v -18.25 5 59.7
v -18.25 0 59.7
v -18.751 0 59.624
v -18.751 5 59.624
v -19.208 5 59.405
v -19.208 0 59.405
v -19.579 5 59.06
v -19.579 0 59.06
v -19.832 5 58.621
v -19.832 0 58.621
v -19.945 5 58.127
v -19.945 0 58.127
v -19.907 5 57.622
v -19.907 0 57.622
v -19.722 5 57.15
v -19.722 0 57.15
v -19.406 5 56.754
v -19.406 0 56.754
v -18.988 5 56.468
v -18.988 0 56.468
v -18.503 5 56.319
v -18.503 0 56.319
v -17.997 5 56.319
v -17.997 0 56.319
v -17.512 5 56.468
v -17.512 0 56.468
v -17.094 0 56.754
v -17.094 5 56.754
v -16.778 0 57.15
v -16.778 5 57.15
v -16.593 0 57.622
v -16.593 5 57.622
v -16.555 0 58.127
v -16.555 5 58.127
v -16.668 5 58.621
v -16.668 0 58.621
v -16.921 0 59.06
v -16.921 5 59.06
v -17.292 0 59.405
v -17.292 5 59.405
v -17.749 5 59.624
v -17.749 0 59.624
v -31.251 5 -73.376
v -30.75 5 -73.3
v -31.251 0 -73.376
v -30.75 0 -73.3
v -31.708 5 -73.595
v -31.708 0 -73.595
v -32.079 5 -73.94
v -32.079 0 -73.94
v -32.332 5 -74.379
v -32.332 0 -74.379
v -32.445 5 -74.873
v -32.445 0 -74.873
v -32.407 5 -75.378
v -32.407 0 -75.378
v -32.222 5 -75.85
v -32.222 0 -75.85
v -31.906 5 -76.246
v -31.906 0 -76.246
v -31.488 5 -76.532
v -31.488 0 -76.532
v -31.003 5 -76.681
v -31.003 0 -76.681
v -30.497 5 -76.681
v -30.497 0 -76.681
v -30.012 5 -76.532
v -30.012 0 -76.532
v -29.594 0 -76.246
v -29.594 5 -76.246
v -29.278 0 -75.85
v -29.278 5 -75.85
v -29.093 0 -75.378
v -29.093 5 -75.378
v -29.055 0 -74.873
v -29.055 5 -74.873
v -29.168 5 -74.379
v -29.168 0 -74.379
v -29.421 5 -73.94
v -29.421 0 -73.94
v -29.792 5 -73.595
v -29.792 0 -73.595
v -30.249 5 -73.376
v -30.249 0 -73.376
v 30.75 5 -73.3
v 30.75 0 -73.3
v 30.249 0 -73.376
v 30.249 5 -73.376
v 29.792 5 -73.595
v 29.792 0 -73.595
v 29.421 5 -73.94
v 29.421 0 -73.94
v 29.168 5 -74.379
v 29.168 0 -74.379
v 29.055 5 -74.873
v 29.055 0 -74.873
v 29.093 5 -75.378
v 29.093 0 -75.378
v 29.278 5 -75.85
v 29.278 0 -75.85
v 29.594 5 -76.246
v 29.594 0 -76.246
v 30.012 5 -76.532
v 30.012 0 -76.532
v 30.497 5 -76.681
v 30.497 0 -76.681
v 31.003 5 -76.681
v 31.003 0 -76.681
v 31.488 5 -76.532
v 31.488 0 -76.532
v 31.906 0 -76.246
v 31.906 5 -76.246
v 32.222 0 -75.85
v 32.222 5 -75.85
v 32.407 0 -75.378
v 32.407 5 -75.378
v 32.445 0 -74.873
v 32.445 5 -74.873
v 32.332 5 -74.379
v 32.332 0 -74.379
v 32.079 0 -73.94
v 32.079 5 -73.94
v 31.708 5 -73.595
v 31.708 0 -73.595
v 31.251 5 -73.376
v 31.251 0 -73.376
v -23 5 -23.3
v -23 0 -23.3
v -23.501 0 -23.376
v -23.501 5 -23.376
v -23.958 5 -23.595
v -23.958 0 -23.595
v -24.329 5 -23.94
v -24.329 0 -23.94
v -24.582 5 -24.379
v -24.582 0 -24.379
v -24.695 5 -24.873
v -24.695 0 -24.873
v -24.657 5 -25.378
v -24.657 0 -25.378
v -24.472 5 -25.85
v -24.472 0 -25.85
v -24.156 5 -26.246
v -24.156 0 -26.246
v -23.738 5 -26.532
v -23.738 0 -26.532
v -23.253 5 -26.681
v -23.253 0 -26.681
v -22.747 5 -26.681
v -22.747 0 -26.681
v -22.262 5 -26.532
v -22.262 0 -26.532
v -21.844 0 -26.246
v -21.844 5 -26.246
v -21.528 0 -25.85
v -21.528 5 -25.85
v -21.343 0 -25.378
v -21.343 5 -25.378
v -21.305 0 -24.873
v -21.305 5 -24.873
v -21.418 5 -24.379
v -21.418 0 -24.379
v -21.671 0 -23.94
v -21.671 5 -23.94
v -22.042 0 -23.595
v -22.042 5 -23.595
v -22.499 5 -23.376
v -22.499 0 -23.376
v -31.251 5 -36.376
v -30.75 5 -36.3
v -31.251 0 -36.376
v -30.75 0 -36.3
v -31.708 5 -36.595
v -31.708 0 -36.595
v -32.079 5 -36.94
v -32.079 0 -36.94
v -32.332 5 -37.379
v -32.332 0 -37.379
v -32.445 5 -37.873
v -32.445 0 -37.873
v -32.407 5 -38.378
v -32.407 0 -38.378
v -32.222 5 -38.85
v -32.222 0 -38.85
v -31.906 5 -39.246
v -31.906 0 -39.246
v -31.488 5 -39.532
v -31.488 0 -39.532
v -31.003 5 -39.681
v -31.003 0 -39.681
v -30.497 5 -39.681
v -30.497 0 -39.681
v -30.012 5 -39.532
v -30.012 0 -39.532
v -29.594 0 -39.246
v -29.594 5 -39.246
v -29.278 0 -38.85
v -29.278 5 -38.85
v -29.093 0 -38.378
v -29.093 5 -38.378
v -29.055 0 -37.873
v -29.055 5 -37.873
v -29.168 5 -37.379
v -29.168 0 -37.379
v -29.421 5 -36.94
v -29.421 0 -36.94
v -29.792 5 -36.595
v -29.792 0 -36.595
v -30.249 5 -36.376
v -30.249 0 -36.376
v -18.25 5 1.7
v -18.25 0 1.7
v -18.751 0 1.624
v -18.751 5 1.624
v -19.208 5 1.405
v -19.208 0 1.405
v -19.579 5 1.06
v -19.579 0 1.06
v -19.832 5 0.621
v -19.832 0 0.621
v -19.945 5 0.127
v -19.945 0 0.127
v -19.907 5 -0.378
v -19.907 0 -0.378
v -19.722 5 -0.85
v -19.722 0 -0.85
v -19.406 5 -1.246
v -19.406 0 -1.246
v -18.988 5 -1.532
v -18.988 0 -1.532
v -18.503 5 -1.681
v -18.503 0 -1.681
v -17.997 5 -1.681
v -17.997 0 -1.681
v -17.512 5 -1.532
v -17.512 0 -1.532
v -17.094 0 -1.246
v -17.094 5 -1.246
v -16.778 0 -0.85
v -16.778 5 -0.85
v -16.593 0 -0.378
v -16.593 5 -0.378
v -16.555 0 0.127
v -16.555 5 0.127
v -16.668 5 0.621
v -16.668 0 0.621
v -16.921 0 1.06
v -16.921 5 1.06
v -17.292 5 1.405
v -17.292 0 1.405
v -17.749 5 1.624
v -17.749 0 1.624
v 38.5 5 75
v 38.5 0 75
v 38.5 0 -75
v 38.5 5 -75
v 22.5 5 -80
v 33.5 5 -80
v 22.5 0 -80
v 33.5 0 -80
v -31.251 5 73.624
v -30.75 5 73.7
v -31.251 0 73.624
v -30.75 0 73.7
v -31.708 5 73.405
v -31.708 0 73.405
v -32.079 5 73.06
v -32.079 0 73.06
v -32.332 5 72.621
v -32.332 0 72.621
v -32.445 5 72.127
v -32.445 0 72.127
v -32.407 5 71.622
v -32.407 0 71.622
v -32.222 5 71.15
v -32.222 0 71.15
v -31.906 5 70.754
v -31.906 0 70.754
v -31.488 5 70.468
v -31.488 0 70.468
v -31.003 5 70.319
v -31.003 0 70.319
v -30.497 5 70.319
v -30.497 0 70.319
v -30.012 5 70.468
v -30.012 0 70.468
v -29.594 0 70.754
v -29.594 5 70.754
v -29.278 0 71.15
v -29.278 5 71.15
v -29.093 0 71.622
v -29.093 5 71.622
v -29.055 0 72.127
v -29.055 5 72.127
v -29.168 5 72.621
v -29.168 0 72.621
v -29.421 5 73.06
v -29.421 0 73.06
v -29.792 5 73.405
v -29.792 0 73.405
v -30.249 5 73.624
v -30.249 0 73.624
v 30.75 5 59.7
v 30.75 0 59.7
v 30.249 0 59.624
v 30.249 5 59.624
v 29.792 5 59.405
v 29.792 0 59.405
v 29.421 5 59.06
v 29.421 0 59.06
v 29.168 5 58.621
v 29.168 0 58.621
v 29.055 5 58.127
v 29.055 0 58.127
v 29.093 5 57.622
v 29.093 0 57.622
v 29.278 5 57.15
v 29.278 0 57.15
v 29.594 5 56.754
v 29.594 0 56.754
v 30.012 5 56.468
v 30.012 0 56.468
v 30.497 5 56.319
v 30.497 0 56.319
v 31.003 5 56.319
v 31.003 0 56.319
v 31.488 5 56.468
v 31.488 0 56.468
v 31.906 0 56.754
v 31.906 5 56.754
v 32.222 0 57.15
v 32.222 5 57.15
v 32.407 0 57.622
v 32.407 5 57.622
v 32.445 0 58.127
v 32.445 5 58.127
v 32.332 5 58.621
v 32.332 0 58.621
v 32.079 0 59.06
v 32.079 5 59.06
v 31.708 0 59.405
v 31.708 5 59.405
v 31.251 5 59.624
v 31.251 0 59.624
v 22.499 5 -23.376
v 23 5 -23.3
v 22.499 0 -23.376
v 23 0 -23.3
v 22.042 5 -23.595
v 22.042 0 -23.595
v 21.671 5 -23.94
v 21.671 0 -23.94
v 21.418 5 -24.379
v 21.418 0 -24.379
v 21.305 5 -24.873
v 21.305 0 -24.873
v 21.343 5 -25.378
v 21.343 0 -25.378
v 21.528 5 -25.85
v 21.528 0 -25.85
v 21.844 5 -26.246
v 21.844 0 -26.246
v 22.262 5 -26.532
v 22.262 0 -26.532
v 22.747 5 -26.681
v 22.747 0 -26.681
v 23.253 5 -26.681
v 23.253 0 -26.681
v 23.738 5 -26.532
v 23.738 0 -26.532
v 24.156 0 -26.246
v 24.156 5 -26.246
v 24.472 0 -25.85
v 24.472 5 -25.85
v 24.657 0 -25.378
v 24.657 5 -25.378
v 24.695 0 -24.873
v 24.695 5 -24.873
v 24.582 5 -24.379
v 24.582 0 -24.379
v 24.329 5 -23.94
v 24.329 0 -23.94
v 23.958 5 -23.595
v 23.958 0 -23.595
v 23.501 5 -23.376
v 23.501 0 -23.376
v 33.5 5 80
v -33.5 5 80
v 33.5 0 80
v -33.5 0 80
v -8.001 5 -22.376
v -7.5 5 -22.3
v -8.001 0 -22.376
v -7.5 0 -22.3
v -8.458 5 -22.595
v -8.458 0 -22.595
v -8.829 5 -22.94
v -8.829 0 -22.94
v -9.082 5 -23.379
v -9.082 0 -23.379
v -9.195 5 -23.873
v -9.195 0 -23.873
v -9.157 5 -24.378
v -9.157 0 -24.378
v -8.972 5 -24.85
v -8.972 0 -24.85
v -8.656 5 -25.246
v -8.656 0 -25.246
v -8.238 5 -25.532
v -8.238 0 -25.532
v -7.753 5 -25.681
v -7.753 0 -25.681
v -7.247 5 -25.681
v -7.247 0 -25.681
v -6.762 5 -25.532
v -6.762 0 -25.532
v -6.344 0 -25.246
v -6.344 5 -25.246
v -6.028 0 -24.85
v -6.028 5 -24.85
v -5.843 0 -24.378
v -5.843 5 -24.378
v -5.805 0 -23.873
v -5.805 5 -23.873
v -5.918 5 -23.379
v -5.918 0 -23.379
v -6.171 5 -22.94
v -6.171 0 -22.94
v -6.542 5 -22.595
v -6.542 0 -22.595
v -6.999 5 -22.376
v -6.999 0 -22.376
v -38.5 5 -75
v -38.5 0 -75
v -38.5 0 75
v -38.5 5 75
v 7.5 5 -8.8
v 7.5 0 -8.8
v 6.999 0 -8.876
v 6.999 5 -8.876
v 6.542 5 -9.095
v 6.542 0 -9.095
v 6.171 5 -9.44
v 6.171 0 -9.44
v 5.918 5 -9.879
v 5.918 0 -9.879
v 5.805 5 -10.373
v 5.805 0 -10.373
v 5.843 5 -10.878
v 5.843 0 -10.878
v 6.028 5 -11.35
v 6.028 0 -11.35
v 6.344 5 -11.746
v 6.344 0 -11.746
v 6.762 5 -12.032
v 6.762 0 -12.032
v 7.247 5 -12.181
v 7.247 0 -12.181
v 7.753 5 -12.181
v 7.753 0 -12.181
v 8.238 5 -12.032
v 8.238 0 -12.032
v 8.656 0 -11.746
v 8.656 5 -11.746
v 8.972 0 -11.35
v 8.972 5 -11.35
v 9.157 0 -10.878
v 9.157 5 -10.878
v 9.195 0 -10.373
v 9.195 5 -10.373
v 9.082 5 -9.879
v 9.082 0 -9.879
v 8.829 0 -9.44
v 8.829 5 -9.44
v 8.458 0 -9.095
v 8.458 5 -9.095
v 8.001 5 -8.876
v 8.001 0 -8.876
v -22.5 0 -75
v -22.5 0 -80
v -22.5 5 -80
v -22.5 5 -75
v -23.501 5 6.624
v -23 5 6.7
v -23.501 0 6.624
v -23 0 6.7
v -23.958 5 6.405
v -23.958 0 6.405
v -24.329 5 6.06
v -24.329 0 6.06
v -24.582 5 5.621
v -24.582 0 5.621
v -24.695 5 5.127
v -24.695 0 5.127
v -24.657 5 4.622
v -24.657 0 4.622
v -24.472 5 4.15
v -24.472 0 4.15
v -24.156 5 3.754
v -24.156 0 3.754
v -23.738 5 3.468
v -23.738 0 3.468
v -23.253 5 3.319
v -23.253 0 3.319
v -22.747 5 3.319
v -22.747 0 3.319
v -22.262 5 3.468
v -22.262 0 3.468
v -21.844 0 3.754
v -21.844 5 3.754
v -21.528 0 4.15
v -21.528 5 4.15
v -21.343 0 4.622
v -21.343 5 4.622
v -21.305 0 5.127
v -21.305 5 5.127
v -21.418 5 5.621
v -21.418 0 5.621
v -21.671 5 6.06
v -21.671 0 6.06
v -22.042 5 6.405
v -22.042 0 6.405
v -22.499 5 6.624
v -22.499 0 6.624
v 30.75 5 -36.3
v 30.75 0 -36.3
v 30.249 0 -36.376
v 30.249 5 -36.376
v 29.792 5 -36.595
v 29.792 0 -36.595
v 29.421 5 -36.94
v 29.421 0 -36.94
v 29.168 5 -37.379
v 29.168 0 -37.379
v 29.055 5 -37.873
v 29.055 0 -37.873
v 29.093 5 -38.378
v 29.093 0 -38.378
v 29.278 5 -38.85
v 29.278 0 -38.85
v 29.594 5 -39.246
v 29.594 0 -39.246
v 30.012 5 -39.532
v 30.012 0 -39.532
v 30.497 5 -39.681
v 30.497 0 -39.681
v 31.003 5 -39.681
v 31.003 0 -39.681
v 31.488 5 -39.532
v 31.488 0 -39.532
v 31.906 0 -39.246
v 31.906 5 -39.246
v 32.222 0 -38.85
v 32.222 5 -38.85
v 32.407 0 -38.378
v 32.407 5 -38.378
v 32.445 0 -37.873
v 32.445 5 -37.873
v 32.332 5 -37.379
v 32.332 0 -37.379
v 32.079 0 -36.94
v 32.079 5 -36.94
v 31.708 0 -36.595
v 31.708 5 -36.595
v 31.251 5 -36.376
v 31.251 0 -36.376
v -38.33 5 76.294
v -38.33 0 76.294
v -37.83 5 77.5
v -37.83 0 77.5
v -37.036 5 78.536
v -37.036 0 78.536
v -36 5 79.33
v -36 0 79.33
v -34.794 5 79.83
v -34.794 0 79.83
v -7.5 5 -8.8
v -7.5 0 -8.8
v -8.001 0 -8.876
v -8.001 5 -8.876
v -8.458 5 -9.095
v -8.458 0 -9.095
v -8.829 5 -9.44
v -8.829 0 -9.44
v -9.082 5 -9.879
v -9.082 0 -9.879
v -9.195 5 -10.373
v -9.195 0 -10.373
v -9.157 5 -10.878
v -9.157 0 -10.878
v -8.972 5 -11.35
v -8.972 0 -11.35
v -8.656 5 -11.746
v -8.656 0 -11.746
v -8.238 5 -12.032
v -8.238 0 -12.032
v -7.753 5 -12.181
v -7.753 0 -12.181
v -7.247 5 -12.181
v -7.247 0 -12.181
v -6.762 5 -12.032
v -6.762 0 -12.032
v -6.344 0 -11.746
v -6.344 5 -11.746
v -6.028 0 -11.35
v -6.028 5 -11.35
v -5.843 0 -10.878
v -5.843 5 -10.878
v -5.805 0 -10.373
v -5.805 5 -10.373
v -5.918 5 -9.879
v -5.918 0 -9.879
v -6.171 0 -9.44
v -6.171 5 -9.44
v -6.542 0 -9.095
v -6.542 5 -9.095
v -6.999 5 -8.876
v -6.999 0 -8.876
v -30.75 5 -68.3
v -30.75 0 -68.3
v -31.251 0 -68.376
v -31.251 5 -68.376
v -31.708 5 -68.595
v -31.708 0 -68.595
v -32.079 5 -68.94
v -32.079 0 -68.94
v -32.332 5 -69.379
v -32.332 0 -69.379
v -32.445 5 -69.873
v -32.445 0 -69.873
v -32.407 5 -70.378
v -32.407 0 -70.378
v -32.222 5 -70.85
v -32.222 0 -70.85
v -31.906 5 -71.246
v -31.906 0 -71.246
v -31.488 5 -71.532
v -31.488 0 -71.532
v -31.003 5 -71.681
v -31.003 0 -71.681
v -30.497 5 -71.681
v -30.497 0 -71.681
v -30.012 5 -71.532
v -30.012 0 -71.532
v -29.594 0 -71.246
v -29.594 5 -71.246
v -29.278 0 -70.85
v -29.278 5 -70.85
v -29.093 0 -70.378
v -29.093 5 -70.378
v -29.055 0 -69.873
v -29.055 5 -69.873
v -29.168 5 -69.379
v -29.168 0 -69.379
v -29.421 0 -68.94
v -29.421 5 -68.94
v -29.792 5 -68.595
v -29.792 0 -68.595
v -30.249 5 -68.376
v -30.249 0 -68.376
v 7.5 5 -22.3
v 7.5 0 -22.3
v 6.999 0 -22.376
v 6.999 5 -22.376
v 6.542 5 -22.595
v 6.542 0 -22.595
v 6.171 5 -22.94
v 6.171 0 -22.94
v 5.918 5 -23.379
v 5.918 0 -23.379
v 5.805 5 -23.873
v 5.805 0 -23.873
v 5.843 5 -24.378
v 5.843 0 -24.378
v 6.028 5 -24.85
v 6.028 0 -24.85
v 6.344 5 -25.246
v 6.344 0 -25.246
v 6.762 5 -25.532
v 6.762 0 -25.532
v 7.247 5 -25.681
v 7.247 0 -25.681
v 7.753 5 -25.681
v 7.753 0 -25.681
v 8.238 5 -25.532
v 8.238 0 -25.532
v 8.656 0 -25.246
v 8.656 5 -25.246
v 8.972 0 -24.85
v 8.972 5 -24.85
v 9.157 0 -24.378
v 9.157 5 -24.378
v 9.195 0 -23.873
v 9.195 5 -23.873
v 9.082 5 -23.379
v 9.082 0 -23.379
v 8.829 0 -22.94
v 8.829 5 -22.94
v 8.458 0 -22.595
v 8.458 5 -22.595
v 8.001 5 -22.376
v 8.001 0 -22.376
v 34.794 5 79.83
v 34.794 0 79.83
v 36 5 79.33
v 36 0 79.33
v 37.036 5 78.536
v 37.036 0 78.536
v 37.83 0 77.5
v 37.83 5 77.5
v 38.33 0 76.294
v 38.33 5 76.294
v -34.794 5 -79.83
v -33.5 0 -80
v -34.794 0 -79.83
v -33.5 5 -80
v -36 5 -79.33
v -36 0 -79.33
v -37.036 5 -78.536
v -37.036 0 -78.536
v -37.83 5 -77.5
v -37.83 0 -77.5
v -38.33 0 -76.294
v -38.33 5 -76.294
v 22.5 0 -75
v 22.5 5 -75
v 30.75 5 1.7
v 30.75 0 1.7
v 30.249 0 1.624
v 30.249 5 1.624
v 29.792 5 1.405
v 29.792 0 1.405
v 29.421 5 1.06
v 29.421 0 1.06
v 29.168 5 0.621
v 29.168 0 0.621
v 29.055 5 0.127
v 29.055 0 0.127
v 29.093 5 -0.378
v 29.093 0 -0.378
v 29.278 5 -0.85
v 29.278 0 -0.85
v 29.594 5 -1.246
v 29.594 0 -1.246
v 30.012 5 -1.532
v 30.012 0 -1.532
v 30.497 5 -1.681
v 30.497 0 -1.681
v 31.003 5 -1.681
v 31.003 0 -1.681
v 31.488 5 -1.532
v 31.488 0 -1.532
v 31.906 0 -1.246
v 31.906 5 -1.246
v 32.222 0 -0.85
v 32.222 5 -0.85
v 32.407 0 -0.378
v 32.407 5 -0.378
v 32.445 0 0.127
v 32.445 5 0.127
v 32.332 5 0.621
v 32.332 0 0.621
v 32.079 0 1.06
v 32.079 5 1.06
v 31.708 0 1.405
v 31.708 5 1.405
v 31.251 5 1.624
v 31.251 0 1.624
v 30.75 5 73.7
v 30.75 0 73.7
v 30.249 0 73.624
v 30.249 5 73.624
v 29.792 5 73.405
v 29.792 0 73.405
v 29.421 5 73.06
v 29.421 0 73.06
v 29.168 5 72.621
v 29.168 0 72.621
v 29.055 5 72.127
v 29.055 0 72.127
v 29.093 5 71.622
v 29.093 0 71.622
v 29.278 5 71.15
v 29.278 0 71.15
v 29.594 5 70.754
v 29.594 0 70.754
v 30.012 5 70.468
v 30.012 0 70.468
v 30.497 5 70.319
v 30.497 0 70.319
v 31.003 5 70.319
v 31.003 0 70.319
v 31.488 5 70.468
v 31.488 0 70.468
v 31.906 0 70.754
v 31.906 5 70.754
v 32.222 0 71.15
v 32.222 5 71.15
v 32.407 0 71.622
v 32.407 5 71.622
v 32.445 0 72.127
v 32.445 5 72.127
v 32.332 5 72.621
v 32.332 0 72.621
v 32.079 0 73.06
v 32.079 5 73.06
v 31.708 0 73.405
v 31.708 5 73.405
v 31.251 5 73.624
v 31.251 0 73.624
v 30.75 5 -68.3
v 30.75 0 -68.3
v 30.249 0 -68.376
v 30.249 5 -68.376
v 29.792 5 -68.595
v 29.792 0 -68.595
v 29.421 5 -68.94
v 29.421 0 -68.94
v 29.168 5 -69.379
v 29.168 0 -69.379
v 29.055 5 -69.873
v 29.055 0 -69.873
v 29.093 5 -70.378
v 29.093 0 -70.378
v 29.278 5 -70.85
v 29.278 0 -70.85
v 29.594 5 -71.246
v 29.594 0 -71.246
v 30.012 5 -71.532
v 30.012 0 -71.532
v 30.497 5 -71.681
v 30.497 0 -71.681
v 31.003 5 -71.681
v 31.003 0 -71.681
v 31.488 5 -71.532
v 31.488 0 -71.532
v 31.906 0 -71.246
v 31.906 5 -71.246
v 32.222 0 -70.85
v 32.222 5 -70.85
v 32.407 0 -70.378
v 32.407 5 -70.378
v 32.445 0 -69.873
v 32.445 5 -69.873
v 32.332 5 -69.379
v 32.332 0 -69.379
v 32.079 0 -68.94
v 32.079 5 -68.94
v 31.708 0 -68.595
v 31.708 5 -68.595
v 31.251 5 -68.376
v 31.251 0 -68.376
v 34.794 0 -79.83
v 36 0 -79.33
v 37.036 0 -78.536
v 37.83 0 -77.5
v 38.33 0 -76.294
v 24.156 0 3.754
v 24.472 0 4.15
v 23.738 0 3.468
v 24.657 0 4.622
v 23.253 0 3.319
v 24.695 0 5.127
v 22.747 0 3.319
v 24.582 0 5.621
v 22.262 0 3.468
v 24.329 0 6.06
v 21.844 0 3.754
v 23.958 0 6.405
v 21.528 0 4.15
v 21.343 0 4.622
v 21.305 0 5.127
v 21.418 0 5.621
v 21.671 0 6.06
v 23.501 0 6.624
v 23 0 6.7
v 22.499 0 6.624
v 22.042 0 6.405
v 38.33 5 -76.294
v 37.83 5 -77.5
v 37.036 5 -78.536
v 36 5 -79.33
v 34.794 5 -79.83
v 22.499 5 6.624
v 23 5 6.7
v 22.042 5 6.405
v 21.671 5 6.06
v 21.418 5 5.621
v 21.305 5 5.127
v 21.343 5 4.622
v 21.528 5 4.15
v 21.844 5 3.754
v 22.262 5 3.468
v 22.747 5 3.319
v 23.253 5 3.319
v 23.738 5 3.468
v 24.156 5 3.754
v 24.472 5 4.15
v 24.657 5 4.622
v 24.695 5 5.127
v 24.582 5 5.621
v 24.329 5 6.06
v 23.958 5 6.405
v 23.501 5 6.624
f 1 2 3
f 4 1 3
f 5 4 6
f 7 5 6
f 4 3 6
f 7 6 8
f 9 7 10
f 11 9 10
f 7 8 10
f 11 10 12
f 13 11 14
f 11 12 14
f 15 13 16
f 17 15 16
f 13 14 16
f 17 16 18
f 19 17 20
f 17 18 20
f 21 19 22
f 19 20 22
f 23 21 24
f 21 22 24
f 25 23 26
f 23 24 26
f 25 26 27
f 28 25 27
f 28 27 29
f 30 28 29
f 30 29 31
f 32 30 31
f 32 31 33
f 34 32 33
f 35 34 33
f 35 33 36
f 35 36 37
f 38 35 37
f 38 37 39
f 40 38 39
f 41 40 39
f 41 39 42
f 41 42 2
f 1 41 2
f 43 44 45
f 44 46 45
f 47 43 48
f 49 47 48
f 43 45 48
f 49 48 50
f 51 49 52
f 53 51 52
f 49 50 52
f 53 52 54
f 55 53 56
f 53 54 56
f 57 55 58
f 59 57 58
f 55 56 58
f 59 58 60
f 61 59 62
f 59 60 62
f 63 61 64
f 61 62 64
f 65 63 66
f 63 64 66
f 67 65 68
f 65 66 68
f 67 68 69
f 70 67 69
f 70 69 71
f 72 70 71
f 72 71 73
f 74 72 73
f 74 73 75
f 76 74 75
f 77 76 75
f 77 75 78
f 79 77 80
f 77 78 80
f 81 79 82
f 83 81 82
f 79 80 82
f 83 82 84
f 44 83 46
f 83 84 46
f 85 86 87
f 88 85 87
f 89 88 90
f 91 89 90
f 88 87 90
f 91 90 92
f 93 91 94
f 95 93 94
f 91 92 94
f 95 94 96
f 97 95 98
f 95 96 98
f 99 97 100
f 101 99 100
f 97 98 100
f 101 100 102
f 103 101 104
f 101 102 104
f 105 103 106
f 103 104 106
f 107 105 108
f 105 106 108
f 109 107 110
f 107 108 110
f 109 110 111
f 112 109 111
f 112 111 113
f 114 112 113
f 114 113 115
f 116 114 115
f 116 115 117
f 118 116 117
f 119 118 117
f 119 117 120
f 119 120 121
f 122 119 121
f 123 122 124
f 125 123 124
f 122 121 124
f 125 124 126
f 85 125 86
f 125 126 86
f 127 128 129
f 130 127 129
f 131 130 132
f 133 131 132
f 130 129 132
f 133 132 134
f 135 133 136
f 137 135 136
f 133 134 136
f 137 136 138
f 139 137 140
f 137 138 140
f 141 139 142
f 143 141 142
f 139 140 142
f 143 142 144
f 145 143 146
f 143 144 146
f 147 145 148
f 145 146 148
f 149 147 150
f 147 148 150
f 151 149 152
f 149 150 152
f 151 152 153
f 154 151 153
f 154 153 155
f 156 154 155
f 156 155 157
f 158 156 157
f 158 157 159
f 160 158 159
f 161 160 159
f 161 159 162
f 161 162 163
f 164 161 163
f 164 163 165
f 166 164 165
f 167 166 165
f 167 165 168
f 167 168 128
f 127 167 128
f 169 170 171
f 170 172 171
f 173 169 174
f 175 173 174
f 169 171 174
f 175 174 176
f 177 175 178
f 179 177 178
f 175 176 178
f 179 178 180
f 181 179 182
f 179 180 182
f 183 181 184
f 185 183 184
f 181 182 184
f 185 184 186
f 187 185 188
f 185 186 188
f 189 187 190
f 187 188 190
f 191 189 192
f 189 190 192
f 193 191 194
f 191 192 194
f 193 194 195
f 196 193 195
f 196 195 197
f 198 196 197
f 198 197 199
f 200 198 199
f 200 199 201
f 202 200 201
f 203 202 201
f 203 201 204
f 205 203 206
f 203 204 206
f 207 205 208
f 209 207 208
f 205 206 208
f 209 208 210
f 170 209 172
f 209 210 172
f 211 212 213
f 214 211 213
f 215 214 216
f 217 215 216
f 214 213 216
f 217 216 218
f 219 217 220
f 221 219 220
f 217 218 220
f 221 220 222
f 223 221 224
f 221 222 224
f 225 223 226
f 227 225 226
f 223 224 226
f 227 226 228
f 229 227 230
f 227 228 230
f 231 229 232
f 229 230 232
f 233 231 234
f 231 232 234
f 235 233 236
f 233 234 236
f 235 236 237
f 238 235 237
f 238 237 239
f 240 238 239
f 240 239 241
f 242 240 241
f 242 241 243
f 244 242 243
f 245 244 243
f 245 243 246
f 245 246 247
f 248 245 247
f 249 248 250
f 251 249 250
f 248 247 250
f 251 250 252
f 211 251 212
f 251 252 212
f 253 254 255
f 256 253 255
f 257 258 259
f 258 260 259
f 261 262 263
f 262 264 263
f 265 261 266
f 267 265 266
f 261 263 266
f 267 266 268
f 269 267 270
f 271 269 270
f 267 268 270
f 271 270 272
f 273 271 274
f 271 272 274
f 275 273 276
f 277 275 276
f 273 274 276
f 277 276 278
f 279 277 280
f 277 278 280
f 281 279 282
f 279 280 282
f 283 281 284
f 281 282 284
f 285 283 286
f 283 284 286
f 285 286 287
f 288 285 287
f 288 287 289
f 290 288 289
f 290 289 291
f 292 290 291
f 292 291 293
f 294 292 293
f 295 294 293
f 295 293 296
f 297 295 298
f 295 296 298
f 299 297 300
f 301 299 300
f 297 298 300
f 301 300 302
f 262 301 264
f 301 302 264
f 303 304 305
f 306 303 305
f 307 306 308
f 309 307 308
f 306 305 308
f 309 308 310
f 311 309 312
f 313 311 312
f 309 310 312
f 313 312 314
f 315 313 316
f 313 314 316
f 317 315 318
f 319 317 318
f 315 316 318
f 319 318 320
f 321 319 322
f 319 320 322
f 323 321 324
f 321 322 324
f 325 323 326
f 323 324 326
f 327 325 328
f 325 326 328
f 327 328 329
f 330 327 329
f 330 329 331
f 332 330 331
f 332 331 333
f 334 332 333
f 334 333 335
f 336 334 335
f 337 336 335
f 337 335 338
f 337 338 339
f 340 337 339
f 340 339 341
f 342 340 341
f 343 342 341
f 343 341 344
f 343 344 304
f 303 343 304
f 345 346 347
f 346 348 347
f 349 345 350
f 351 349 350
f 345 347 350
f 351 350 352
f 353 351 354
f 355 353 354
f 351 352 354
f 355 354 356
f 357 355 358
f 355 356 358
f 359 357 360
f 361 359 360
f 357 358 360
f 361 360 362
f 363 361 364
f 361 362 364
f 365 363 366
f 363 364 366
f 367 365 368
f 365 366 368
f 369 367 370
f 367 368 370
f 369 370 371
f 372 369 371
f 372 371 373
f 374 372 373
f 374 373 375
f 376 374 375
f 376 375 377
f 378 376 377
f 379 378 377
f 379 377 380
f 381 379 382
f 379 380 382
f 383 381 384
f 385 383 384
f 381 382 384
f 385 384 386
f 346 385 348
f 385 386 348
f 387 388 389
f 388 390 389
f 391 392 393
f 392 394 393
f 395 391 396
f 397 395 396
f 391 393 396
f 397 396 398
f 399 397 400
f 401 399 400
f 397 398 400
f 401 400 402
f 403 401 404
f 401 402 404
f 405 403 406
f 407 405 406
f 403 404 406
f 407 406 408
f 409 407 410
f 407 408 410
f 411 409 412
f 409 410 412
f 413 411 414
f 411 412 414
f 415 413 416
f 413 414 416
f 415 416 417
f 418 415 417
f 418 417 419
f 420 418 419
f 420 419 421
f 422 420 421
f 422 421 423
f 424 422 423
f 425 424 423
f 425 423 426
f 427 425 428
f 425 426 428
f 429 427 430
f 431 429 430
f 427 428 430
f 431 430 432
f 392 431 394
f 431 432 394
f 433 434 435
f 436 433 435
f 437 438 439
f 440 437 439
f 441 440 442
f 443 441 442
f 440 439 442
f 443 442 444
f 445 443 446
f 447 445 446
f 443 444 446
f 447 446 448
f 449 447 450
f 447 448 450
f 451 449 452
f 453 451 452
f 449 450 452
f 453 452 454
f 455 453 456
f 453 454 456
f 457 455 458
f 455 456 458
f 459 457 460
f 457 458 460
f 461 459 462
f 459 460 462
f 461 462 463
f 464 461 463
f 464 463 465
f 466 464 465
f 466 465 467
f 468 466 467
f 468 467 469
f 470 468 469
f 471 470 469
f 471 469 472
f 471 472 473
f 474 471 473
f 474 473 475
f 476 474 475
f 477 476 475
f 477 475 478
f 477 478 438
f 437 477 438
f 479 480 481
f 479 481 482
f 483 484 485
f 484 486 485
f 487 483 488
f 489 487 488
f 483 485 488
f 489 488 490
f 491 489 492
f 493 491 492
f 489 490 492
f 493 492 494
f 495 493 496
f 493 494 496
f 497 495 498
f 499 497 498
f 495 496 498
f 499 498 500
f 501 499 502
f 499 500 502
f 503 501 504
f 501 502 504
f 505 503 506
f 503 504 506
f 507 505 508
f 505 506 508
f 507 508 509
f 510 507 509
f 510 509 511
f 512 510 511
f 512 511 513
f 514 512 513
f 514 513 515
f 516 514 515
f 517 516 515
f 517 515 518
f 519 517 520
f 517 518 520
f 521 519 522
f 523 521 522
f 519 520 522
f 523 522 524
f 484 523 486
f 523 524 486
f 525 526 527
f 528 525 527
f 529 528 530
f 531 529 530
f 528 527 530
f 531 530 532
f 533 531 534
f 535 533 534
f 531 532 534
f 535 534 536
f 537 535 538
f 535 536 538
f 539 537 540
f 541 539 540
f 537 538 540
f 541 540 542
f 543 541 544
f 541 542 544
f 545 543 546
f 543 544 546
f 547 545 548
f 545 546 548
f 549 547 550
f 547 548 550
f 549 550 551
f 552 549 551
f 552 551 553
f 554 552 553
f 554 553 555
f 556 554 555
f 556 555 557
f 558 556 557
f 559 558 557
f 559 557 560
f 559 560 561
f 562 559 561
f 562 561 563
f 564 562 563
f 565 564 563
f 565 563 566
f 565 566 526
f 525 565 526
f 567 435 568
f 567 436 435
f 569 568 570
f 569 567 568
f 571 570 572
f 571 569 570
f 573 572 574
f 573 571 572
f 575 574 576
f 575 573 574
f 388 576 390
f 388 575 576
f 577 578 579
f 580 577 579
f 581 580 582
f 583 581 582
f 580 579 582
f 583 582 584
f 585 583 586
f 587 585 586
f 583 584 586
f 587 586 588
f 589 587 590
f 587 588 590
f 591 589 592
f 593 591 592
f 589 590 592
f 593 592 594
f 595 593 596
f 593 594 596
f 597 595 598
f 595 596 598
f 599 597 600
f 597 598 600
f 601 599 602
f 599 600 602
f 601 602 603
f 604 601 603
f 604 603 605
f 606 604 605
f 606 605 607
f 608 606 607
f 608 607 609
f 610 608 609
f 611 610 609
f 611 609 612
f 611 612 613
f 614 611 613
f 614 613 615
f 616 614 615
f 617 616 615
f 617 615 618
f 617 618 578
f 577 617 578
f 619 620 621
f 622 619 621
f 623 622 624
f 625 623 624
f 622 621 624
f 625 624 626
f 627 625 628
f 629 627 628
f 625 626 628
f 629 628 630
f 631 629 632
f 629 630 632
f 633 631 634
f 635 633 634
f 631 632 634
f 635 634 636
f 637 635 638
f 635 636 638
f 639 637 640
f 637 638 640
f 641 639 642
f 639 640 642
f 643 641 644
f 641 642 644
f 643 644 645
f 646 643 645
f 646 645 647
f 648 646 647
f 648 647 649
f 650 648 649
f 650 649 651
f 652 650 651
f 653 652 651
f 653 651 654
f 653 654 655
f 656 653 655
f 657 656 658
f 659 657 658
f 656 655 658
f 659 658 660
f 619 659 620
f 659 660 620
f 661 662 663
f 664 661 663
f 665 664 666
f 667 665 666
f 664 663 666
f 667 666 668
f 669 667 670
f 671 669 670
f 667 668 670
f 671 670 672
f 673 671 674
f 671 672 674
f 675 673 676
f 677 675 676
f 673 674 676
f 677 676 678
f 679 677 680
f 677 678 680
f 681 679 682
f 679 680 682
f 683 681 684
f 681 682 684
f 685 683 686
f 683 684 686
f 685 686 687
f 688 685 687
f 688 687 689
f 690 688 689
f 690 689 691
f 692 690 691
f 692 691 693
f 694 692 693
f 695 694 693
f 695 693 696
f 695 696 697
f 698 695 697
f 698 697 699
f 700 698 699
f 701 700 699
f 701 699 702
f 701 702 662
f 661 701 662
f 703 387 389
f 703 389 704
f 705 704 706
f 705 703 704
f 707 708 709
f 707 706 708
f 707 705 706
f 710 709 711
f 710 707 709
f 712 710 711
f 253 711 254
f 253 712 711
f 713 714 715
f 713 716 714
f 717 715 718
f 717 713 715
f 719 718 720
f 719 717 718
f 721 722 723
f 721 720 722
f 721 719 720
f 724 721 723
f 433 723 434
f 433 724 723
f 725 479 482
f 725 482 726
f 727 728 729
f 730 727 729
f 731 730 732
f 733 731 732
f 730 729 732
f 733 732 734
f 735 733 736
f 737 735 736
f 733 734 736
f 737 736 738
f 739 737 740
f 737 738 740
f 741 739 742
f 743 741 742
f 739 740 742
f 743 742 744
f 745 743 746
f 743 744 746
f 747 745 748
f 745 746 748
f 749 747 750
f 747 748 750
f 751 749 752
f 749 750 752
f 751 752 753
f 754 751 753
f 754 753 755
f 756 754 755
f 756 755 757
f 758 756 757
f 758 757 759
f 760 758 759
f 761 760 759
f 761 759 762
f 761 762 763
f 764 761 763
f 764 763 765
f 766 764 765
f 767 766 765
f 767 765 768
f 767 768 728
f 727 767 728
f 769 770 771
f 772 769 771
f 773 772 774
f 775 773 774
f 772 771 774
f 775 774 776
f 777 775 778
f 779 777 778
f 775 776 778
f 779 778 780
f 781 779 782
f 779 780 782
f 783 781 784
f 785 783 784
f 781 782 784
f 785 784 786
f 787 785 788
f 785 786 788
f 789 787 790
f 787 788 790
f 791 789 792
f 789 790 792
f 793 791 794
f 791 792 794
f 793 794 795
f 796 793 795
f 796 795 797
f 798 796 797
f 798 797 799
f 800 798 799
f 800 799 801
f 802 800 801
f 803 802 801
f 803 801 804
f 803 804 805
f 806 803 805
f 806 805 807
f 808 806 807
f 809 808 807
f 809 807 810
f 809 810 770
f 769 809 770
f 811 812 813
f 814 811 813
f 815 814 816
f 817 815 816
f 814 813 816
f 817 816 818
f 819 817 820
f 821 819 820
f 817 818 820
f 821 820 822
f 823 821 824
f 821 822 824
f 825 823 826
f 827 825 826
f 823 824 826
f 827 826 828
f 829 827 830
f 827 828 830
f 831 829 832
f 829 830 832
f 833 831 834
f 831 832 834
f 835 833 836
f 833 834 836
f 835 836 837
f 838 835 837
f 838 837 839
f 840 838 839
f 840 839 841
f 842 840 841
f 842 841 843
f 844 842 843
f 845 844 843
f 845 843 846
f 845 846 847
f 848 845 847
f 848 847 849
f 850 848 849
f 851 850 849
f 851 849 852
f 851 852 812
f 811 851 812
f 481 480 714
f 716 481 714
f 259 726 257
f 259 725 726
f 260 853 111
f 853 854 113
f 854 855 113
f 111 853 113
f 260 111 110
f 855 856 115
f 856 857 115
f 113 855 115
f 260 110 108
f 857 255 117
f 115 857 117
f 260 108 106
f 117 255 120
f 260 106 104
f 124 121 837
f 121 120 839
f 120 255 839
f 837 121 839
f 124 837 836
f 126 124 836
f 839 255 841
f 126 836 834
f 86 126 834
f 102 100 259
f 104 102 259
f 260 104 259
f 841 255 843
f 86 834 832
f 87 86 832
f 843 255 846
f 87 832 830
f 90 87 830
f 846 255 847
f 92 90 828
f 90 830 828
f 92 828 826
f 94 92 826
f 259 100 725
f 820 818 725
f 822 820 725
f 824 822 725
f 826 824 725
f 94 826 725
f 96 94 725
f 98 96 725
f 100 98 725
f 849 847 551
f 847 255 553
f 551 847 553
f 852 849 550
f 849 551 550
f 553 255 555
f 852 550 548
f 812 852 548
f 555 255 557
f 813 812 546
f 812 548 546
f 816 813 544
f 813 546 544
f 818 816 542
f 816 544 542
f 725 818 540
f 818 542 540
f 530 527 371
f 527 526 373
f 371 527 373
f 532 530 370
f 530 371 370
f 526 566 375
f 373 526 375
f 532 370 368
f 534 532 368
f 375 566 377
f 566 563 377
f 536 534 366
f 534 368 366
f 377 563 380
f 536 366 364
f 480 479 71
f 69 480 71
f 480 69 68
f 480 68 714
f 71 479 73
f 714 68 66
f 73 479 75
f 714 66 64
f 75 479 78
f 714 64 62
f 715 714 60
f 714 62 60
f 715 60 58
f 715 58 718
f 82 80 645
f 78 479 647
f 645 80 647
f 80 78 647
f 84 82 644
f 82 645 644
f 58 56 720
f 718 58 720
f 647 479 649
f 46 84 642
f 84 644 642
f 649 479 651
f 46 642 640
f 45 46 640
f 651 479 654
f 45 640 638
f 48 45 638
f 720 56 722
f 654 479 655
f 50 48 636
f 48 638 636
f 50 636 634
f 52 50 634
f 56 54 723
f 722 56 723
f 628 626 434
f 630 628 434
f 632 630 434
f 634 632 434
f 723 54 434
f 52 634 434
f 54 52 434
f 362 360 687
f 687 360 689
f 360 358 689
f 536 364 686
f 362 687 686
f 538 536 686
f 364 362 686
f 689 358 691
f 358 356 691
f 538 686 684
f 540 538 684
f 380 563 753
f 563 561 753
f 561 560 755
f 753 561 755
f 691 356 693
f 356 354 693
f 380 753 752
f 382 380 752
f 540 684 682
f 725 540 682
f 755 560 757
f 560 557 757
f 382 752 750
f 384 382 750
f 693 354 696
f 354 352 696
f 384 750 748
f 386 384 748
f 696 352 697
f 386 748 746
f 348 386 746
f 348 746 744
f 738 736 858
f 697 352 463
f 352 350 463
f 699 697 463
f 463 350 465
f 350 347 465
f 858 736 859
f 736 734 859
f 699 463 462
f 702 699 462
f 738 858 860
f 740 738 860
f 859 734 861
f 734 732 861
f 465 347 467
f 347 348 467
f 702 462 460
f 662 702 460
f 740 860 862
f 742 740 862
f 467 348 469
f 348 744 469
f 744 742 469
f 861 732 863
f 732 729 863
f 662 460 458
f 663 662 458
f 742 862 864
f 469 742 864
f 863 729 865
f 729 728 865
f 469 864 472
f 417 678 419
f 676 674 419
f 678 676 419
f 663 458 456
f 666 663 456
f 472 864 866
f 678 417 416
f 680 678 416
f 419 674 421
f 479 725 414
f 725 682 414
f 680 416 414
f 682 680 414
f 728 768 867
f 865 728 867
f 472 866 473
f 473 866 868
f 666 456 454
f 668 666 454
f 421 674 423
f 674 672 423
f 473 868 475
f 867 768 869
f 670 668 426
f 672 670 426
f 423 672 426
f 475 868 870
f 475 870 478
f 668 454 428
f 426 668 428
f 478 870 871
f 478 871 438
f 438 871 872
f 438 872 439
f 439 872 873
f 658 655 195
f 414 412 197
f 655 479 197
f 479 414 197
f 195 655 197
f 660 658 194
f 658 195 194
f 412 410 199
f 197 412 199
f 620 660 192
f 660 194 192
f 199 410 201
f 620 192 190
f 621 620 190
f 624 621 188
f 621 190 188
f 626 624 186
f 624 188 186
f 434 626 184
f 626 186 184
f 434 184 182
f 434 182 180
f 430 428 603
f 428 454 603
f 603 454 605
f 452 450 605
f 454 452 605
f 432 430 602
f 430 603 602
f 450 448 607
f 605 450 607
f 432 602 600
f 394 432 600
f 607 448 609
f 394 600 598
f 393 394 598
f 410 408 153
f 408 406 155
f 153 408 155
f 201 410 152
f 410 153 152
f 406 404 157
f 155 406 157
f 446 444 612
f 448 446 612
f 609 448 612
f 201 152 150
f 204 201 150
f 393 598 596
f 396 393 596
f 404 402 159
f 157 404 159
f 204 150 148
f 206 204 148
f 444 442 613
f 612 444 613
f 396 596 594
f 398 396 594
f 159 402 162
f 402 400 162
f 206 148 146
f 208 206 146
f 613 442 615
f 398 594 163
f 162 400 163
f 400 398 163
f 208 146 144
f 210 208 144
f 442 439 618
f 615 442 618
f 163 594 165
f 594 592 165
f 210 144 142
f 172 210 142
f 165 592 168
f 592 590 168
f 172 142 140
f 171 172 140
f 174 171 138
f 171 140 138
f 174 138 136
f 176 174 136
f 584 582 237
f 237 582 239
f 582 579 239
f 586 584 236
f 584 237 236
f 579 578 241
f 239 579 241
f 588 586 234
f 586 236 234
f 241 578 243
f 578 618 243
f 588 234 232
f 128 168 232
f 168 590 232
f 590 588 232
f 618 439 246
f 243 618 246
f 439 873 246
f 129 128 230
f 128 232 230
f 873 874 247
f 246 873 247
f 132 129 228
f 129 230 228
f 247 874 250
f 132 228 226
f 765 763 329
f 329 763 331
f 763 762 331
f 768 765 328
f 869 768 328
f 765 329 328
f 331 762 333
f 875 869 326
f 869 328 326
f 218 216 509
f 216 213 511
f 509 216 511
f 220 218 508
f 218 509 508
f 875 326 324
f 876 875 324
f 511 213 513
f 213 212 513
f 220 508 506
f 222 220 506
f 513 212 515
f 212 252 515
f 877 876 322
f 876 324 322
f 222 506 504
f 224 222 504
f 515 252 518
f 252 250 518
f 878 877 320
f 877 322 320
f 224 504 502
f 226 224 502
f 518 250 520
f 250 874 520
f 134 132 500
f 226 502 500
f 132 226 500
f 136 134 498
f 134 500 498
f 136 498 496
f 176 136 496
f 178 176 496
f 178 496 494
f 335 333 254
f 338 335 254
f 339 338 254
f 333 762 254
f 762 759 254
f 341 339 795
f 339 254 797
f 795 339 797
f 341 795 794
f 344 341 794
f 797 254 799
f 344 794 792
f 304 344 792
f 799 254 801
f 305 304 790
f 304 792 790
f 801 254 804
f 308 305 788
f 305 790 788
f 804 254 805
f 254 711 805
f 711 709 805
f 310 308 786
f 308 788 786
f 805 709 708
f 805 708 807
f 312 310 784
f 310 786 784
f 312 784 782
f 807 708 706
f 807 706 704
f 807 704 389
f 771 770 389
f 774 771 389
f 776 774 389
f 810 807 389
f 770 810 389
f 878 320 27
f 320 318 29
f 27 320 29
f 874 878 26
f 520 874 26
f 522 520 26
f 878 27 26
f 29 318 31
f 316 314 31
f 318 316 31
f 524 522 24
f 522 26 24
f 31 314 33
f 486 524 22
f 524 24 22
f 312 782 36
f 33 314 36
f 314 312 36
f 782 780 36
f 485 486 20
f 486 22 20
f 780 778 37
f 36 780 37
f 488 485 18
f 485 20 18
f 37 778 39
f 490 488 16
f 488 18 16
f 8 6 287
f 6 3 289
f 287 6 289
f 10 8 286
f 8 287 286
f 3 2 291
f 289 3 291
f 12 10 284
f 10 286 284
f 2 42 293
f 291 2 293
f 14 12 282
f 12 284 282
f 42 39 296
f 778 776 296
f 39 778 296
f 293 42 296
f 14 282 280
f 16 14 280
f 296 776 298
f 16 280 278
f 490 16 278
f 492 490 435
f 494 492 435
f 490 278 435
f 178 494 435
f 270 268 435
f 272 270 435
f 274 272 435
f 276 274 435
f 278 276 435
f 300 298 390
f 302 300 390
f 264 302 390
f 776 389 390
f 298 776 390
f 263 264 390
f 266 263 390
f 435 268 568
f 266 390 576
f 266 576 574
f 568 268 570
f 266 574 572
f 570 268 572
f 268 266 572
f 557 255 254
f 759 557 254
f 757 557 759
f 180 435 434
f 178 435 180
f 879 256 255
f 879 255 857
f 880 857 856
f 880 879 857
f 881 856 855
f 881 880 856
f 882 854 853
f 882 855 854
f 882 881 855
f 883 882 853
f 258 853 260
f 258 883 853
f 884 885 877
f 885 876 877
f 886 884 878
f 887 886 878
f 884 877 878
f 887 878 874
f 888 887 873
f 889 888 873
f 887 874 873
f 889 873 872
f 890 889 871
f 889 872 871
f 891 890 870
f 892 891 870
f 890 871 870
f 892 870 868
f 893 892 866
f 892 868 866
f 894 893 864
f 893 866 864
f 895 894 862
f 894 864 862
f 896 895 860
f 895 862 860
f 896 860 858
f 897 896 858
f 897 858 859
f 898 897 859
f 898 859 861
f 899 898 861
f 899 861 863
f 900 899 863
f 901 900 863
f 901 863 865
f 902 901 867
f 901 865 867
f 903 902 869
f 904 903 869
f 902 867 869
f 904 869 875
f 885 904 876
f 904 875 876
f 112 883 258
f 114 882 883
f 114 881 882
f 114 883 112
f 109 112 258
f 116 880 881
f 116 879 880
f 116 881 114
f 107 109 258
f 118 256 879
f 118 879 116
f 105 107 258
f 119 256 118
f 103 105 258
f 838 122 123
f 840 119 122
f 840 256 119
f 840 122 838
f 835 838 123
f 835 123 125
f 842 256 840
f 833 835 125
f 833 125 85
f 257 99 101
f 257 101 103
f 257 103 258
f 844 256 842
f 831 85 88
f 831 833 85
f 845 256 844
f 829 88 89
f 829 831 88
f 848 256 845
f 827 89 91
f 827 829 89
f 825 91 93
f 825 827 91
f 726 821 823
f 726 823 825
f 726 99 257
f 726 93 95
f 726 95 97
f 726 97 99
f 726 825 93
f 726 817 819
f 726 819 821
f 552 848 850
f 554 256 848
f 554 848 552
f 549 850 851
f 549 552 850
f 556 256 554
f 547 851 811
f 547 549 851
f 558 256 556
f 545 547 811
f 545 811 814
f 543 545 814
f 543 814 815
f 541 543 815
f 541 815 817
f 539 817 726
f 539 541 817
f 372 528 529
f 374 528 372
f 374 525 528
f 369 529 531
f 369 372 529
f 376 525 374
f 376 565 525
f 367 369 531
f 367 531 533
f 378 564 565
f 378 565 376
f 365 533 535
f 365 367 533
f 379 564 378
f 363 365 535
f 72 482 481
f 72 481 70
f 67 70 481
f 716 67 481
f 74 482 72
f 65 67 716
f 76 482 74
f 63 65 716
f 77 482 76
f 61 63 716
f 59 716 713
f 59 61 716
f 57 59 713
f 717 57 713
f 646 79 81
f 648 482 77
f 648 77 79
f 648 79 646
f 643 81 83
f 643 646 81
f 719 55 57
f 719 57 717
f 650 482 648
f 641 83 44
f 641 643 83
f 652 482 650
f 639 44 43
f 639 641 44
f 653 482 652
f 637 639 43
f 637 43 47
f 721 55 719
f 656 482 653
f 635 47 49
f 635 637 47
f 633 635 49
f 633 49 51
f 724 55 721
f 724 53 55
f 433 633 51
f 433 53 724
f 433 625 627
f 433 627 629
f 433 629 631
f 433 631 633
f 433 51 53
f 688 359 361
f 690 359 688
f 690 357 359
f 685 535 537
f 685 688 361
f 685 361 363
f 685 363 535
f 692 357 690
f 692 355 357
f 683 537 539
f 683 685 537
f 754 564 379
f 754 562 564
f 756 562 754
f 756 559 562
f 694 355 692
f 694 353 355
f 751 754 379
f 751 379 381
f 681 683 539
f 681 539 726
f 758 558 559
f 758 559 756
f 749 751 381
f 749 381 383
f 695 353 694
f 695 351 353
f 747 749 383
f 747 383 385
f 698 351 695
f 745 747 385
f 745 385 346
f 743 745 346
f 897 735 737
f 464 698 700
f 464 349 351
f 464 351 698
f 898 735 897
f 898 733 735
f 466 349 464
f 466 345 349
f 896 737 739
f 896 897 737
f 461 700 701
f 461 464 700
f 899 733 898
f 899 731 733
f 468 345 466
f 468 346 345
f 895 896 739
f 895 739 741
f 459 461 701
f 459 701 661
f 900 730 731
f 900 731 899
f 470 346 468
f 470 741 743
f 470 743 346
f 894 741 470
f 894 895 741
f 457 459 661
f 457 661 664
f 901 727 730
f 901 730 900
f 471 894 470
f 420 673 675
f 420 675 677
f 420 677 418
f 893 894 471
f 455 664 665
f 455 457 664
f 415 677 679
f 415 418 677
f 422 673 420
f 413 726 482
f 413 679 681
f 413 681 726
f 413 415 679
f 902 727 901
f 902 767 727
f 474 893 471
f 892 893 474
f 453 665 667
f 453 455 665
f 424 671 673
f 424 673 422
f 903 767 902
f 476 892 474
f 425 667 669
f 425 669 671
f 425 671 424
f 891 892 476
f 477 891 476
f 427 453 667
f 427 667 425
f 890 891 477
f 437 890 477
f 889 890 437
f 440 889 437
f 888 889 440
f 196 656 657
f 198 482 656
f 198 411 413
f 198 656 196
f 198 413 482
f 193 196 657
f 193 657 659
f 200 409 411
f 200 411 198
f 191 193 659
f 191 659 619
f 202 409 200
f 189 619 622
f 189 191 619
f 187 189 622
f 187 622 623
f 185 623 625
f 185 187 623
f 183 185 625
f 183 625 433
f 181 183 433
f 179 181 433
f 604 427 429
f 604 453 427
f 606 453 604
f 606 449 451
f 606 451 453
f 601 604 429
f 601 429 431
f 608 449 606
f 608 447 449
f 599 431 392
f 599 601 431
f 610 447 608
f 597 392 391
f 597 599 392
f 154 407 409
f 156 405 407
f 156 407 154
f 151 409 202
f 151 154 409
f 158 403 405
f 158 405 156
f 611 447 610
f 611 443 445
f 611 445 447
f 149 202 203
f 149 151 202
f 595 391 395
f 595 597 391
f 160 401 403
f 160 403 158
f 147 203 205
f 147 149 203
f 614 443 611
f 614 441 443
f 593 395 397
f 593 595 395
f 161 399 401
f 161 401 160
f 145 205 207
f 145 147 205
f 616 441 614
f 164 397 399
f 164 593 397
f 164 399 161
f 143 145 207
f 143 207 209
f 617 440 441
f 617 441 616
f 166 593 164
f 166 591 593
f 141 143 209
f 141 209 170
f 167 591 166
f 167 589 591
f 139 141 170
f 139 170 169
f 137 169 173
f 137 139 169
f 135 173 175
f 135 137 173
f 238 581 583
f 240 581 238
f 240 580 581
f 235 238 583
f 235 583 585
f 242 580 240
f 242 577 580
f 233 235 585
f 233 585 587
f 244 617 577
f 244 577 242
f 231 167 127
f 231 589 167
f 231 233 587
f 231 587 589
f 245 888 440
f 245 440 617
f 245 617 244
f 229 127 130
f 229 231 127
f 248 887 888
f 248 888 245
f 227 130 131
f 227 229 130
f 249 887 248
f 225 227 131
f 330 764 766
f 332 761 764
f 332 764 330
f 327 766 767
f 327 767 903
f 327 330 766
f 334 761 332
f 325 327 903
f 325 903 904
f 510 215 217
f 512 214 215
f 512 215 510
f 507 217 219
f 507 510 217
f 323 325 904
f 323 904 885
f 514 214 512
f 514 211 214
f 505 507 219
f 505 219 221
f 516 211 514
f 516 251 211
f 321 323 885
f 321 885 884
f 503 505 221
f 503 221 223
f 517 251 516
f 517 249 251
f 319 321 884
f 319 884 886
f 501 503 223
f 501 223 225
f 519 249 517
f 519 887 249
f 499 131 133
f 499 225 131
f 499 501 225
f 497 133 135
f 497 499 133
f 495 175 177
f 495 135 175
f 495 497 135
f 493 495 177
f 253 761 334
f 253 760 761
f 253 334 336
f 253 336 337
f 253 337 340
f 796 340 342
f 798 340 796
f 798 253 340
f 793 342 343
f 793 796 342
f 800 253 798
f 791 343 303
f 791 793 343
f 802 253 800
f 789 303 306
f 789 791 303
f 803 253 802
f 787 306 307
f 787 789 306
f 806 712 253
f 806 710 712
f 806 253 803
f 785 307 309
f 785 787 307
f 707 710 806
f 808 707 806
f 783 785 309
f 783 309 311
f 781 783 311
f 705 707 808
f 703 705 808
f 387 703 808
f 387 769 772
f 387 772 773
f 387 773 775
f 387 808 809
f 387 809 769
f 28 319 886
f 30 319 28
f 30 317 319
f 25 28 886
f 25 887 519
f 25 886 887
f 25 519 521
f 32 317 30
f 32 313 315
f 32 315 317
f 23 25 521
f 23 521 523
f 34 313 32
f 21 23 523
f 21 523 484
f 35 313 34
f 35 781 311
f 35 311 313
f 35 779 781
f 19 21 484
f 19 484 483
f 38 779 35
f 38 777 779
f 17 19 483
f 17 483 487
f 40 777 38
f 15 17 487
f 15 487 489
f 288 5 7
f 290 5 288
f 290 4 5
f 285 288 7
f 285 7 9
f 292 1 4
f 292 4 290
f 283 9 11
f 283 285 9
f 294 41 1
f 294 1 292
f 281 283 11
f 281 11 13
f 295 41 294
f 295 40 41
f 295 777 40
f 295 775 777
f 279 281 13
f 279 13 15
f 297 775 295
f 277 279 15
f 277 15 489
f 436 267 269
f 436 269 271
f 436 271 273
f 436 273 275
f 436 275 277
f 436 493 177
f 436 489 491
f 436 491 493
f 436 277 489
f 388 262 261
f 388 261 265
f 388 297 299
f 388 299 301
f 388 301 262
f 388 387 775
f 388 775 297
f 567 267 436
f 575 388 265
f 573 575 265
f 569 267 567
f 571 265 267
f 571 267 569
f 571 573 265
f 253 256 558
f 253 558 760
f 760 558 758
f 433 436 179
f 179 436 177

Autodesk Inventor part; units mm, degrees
ref_plane "YZ Plane" through (0, 0, 0) normal (1, 0, 0) x (0, 1, 0)
ref_plane "XZ Plane" through (0, 0, 0) normal (0, 1, 0) x (-1, 0, 0)
ref_plane "XY Plane" through (0, 0, 0) normal (0, 0, 1) x (1, 0, 0)
sketch "Sketch1" plane through (0, 0, 0) normal (0, 1, 0) x (-1, 0, 0)
  line L0 (38.5, 80) -> (-38.5, 80)
  line L1 (-38.5, 80) -> (-38.5, -80)
  line L2 (-38.5, -80) -> (38.5, -80)
  line L3 (38.5, -80) -> (38.5, 80)
  line L4 (38.5, 0) -> (-38.5, 0) construction
  line L5 (0, 80) -> (0, -80) construction
  line L6 (-22.5, -80) -> (22.5, -80)
  line L7 (22.5, -80) -> (22.5, -75)
  line L8 (22.5, -75) -> (-22.5, -75)
  line L9 (-22.5, -75) -> (-22.5, -80)
  point P0 (0, 0)
  point P1 (0, 0)
  dimension "d0" = 77
  dimension "d1" = 160
  dimension "d64" = 45
  dimension "d65" = 5
extrude "Extrusion1" add sketch "Sketch1" along normal blind 5 contours L3 L2 L7 L8 L9 L1 L0
fillet "Fillet1" radius 5 4 edges at (-38.5, 2.5, 80) (38.5, 2.5, 80) (38.5, 2.5, -80) (-38.5, 2.5, -80)
sketch "Sketch3" plane through (0, 5, 0) normal (0, 1, 0) x (1, 0, 0)
  line L0 (33.5, 80) -> (-33.5, 80) construction
  line L1 (-30.75, -72) -> (-30.75, 75) construction
  line L2 (-30.75, 75) -> (30.75, 75) construction
  line L3 (30.75, 75) -> (30.75, -72) construction
  line L4 (30.75, -72) -> (-30.75, -72) construction
  line L5 (0, 112) -> (0, -112) construction
  line L6 (-33.5, -80) -> (33.5, -80) projected
  line L7 (38.5, -75) -> (38.5, 75) projected
  line L8 (-38.5, 75) -> (-38.5, -75) projected
  point P0 (0, 0)
  point P1 (0, -72)
  point P2 (0, -80)
  dimension "d15" = 147
  dimension "d18" = 8
  dimension "d56" = 61.5
hole "Brass stands" at (-30.75, 5, 72) at (30.75, 5, 72) at (30.75, 5, -75) at (-30.75, 5, -75) direction (0, -1, 0) diameter 3.4 end through all
sketch "Sketch5" plane through (0, 5, 0) normal (0, 1, 0) x (1, 0, 0)
  line L0 (-23, -5) -> (23, -5) construction
  line L1 (23, -5) -> (23, 25) construction
  line L2 (23, 25) -> (-23, 25) construction
  line L3 (-23, 25) -> (-23, -5) construction
  line L4 (-23, -5) -> (23, 25) construction
  line L5 (23, -5) -> (-23, 25) construction
  line L6 (0, 112) -> (0, -112) construction
  line L7 (33.5, 80) -> (-33.5, 80) construction
  point P0 (0, 0)
  point P1 (0, 10)
  point P2 (0, 10)
  point P3 (-23, 25)
  point P4 (23, 25)
  dimension "d31" = 30
  dimension "d32" = 46
  dimension "d33" = 55
hole "Battery mount" at (-23, 5, 5) at (-23, 5, -25) at (23, 5, -25) at (23, 5, 5) direction (0, -1, 0) diameter 3.4 end through all
sketch "Sketch7" plane through (0, 5, 0) normal (0, 1, 0) x (1, 0, 0)
  line L0 (7.5, 24) -> (-7.5, 24) construction
  line L1 (-7.5, 24) -> (-7.5, 10.5) construction
  line L2 (-7.5, 10.5) -> (7.5, 10.5) construction
  line L3 (7.5, 10.5) -> (7.5, 24) construction
  line L4 (7.5, 24) -> (-7.5, 10.5) construction
  line L5 (-7.5, 24) -> (7.5, 10.5) construction
  line L6 (33.5, 80) -> (22.5, 80) construction
  line L7 (38.5, -75) -> (38.5, 75) construction
  line L8 (22.5, 75) -> (-22.5, 75) construction
  line L9 (0, 112) -> (0, -112) construction
  point P0 (0, 0)
  point P1 (0, 17.25)
  point P2 (54.473, 10.5)
  point P3 (0, 24)
  point P4 (0, 17.25)
  dimension "d66" = 13.5
  dimension "d67" = 15
  dimension "d71" = 51
hole "pi cam" at (7.5, 5, -24) at (7.5, 5, -10.5) at (54.473, 5, -10.5) at (-7.5, 5, -24) at (-7.5, 5, -10.5) direction (0, -1, 0) diameter 3.4 end through all
sketch "Sketch8" plane through (0, 5, 0) normal (0, 1, 0) x (1, 0, 0)
  circle A0 centre (-7.5, 24) radius 1.7 projected
  circle A1 centre (7.5, 10.5) radius 1.7 projected
  circle A2 centre (7.5, 24) radius 1.7 projected
  circle A3 centre (-7.5, 10.5) radius 1.7 projected
  circle A4 centre (23, 25) radius 1.7 projected
  circle A5 centre (-23, -5) radius 1.7 projected
  circle A6 centre (-23, 25) radius 1.7 projected
  circle A7 centre (23, -5) radius 1.7 projected
  circle A8 centre (30.75, 75) radius 1.7 projected
  circle A9 centre (-30.75, -72) radius 1.7 projected
  circle A10 centre (30.75, -72) radius 1.7 projected
  circle A11 centre (-30.75, 75) radius 1.7 projected
  arc A12 (-33.5, 80) -> (-38.5, 75) centre (-33.5, 75) ccw projected
  line L0 (-38.5, 75) -> (-38.5, -75) projected
  arc A13 (-38.5, -75) -> (-33.5, -80) centre (-33.5, -75) ccw projected
  line L1 (-33.5, -80) -> (33.5, -80) projected
  arc A14 (33.5, -80) -> (38.5, -75) centre (33.5, -75) ccw projected
  line L2 (38.5, -75) -> (38.5, 75) projected
  arc A15 (38.5, 75) -> (33.5, 80) centre (33.5, 75) ccw projected
  line L3 (33.5, 80) -> (22.5, 80) projected
  line L4 (22.5, 80) -> (22.5, 75) projected
  line L5 (22.5, 75) -> (-22.5, 75) projected
  line L6 (-22.5, 75) -> (-22.5, 80) projected
  line L7 (-22.5, 80) -> (-33.5, 80) projected
  line L8 (30.75, 0) -> (-18.25, 0) construction
  line L9 (-18.25, 0) -> (-18.25, -58) construction
  line L10 (-18.25, -58) -> (30.75, -58) construction
  line L11 (30.75, -58) -> (30.75, 0) construction
  line L12 (30.75, 0) -> (-18.25, -58) construction
  line L13 (-18.25, 0) -> (30.75, -58) construction
  point P0 (0, 0)
  point P1 (6.25, -29)
  dimension "d79" = 49
  dimension "d80" = 58
  dimension "d81" = 22
  dimension "d82" = 7.75
hole "raspberry pi" at (30.75, 5, 0) at (30.75, 5, 58) at (-18.25, 5, 58) at (-18.25, 5, 0) direction (0, -1, 0) diameter 3.4 end through all
sketch "buck convertor" plane through (0, 5, 0) normal (0, 1, 0) x (1, 0, 0)
  line L0 (38.5, -75) -> (38.5, 75) projected
  circle A0 centre (-18.25, -58) radius 1.7 projected
  circle A1 centre (30.75, 0) radius 1.7 projected
  circle A2 centre (30.75, -58) radius 1.7 projected
  circle A3 centre (-18.25, 0) radius 1.7 projected
  circle A4 centre (-7.5, 24) radius 1.7 projected
  circle A5 centre (7.5, 10.5) radius 1.7 projected
  circle A6 centre (7.5, 24) radius 1.7 projected
  circle A7 centre (-7.5, 10.5) radius 1.7 projected
  circle A8 centre (23, 25) radius 1.7 projected
  circle A9 centre (-23, -5) radius 1.7 projected
  circle A10 centre (-23, 25) radius 1.7 projected
  circle A11 centre (23, -5) radius 1.7 projected
  circle A12 centre (30.75, 75) radius 1.7 projected
  circle A13 centre (-30.75, -72) radius 1.7 projected
  circle A14 centre (30.75, -72) radius 1.7 projected
  circle A15 centre (-30.75, 75) radius 1.7 projected
  arc A16 (-33.5, 80) -> (-38.5, 75) centre (-33.5, 75) ccw projected
  line L1 (-38.5, 75) -> (-38.5, -75) projected
  arc A17 (-38.5, -75) -> (-33.5, -80) centre (-33.5, -75) ccw projected
  line L2 (-33.5, -80) -> (33.5, -80) projected
  arc A18 (33.5, -80) -> (38.5, -75) centre (33.5, -75) ccw projected
  line L3 (38.5, -75) -> (38.5, 75) projected
  arc A19 (38.5, 75) -> (33.5, 80) centre (33.5, 75) ccw projected
  line L4 (33.5, 80) -> (22.5, 80) projected
  line L5 (22.5, 80) -> (22.5, 75) projected
  line L6 (22.5, 75) -> (-22.5, 75) projected
  line L7 (-22.5, 75) -> (-22.5, 80) projected
  line L8 (-22.5, 80) -> (-33.5, 80) projected
  line L9 (30.75, 70) -> (-30.75, 70) construction
  line L10 (-30.75, 70) -> (-30.75, 38) construction
  line L11 (-30.75, 38) -> (30.75, 38) construction
  line L12 (30.75, 38) -> (30.75, 70) construction
  line L13 (30.75, 70) -> (-30.75, 38) construction
  line L14 (-30.75, 70) -> (30.75, 38) construction
  line L15 (0, 113.4497) -> (0, -113.4497) projected
  point P0 (0, 0)
  point P1 (0, 54)
  point P2 (0, 54)
  dimension "d90" = 32
  dimension "d98" = 10
hole "Hole7" at (30.75, 5, -38) at (-30.75, 5, -38) at (30.75, 5, -70) at (-30.75, 5, -70) direction (0, -1, 0) diameter 3.4 end through all
properties part number "Top plate" material "PBT Plastic"
